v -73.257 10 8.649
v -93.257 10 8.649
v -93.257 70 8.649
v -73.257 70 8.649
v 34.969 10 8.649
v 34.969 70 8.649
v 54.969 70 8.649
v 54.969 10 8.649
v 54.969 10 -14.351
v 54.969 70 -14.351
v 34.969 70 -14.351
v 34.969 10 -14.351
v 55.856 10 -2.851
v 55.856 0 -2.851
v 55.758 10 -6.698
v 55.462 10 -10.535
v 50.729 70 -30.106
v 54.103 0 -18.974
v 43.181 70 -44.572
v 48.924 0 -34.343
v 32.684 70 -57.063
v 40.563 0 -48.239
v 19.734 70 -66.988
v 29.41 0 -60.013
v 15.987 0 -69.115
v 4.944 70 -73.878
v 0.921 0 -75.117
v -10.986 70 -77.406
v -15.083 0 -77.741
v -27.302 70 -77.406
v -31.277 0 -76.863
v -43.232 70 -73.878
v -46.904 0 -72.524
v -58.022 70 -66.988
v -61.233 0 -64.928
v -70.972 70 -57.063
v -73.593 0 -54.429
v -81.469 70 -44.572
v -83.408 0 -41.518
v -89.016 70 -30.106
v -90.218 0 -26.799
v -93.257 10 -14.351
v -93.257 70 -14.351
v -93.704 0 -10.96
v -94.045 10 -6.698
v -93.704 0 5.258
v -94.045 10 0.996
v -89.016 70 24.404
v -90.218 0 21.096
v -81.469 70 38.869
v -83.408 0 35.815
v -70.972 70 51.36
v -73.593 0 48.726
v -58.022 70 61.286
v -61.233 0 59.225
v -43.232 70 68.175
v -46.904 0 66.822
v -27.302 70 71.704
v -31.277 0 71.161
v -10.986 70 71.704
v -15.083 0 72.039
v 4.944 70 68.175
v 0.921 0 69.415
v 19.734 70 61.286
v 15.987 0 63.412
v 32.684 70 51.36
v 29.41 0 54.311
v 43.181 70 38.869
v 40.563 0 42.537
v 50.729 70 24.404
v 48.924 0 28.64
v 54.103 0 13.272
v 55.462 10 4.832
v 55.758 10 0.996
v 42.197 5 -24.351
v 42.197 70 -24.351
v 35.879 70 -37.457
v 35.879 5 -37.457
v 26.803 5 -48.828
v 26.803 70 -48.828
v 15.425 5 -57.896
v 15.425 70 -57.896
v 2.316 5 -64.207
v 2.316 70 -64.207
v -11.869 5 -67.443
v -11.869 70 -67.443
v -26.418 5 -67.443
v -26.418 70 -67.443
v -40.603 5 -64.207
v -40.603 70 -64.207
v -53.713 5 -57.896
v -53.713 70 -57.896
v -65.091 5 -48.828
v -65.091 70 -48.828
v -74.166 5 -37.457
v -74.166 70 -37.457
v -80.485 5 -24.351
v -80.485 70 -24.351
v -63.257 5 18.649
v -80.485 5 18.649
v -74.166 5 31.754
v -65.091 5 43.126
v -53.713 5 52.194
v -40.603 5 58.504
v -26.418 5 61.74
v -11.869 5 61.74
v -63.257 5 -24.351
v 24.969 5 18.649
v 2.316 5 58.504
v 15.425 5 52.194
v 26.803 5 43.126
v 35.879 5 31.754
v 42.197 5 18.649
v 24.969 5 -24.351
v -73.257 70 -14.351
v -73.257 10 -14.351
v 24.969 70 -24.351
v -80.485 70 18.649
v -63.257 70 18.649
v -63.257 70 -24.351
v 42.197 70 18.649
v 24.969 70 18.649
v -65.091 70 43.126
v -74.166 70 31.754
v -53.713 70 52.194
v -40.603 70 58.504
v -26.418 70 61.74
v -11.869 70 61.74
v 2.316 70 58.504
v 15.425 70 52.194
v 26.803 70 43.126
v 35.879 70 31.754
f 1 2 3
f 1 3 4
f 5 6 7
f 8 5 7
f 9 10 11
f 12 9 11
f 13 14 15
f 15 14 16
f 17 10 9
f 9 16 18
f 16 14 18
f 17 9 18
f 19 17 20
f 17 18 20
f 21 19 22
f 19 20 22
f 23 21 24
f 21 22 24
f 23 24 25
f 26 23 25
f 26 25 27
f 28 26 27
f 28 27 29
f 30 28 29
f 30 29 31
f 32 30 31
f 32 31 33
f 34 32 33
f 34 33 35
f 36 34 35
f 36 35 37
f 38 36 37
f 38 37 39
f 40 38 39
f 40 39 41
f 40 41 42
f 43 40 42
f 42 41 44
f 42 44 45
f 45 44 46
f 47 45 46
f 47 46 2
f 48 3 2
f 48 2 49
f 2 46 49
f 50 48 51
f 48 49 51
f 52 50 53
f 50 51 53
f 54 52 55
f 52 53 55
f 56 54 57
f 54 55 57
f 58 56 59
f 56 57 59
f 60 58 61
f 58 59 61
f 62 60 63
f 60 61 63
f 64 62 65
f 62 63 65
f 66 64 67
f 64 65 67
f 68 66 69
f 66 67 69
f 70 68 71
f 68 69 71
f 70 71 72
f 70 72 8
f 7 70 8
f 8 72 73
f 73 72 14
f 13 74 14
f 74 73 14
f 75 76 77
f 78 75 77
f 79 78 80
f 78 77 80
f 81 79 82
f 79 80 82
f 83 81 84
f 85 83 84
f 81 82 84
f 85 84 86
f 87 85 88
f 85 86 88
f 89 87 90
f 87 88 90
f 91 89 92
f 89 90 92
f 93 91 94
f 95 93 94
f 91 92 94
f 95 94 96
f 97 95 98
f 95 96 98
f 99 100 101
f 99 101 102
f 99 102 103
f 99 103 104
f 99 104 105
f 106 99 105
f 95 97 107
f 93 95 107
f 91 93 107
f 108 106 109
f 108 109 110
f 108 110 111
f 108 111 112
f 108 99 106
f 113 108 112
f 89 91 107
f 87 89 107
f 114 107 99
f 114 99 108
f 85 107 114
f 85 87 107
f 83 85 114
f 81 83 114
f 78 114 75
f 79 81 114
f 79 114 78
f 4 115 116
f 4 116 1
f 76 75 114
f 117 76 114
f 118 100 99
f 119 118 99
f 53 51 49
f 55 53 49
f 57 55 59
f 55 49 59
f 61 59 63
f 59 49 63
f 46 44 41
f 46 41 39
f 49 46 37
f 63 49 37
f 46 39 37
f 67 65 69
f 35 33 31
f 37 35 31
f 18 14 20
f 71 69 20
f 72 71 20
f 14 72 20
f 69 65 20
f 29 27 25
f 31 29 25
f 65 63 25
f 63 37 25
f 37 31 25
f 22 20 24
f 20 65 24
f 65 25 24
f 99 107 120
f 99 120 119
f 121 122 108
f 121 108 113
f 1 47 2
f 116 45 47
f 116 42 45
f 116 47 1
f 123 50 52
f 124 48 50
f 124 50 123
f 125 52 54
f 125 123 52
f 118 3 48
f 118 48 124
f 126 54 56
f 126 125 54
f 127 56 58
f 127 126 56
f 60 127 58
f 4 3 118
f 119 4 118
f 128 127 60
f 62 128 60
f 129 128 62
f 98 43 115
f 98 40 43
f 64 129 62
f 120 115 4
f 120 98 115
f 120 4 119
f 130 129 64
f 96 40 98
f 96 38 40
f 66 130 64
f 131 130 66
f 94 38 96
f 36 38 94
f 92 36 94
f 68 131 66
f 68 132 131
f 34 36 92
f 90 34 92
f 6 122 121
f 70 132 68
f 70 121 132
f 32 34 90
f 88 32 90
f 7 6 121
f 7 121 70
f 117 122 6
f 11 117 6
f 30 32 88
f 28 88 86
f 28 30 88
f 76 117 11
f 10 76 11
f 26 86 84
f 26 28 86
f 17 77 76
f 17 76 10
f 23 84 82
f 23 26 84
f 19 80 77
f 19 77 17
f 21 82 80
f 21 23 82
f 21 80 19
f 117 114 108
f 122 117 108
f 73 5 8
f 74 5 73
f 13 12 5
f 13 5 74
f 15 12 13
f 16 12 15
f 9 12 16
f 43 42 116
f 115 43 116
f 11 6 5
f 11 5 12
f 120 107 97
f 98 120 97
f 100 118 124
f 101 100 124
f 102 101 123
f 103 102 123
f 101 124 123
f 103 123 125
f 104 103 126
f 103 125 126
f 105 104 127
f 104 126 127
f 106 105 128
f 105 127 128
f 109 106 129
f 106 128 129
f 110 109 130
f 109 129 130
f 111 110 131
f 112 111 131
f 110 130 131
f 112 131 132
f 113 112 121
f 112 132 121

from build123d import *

# Parameters (mm, degrees)
SKETCH1_R           = 75
BOSS_EXTRUDE1_DEPTH = 70
CUT_EXTRUDE1_DEPTH  = 65
SKETCH3_3_W         = 21.992128126
SKETCH3_3_H         = 23
SKETCH3_3_W_2       = 22.893011501
CUT_EXTRUDE3_DEPTH  = 60
BOSS_EXTRUDE2_START = 65
BOSS_EXTRUDE2_DEPTH = 65


with BuildPart() as part:
    # Sketch1 → Boss-Extrude1 (new body)
    with BuildSketch(Plane(origin=(0, 0, 0), x_dir=(1, 0, 0), z_dir=(0, 1, 0))):
        with Locations((-19.143760263, 2.851198337)):
            Circle(SKETCH1_R)
    extrude(amount=BOSS_EXTRUDE1_DEPTH)

    # Sketch3 → Cut-Extrude1 (cut)
    with BuildSketch(Plane(origin=(0, 70, 0), x_dir=(1, 0, 0), z_dir=(0, 1, 0))):
        with BuildLine():
            Line((34.969329, 14.351198337), (44.830844074, 14.351198337))
            ThreePointArc((44.830844074, 14.351198337), (-19.143760263, 67.851198337), (-83.118364599, 14.351198337))
            Line((-83.118364599, 14.351198337), (-73.256849525, 14.351198337))
            Line((-73.256849525, 14.351198337), (-73.256849525, -8.648801663))
            Line((-73.256849525, -8.648801663), (-83.118364599, -8.648801663))
            ThreePointArc((-83.118364599, -8.648801663), (-19.143760263, -62.148801663), (44.830844074, -8.648801663))
            Line((44.830844074, -8.648801663), (34.969329, -8.648801663))
            Line((34.969329, -8.648801663), (34.969329, 14.351198337))
        make_face()
    extrude(amount=-CUT_EXTRUDE1_DEPTH, mode=Mode.SUBTRACT)

    # Sketch3<3> → Cut-Extrude3 (cut)
    with BuildSketch(Plane(origin=(0, 70, 0), x_dir=(1, 0, 0), z_dir=(0, 1, 0))):
        with Locations((45.965393063, 2.851198337)):
            Rectangle(SKETCH3_3_W, SKETCH3_3_H)
        with Locations((-84.703355276, 2.851198337)):
            Rectangle(SKETCH3_3_W_2, SKETCH3_3_H)
    extrude(amount=-CUT_EXTRUDE3_DEPTH, mode=Mode.SUBTRACT)

    # Sketch6 → Boss-Extrude2 (add)
    with BuildSketch(Plane(origin=(0, 5, 0), x_dir=(1, 0, 0), z_dir=(0, 1, 0)).offset(BOSS_EXTRUDE2_START)):
        with BuildLine():
            ThreePointArc((-80.485018809, 24.351198337), (-82.000871018, 19.403649138), (-83.118364599, 14.351198337))
            Line((-83.118364599, 14.351198337), (-73.256849525, 14.351198337))
            Line((-73.256849525, 14.351198337), (-73.256849525, -8.648801663))
            Line((-73.256849525, -8.648801663), (-83.118364599, -8.648801663))
            ThreePointArc((-83.118364599, -8.648801663), (-82.000871018, -13.701252464), (-80.485018809, -18.648801663))
            Line((-80.485018809, -18.648801663), (-63.256849525, -18.648801663))
            Line((-63.256849525, -18.648801663), (-63.256849525, 24.351198337))
            Line((-63.256849525, 24.351198337), (-80.485018809, 24.351198337))
        make_face()
        with BuildLine():
            ThreePointArc((44.830844074, 14.351198337), (43.713350492, 19.403649138), (42.197498283, 24.351198337))
            Line((42.197498283, 24.351198337), (24.969329, 24.351198337))
            Line((24.969329, 24.351198337), (24.969329, -18.648801663))
            Line((24.969329, -18.648801663), (42.197498283, -18.648801663))
            ThreePointArc((42.197498283, -18.648801663), (43.713350492, -13.701252464), (44.830844074, -8.648801663))
            Line((44.830844074, -8.648801663), (34.969329, -8.648801663))
            Line((34.969329, -8.648801663), (34.969329, 14.351198337))
            Line((34.969329, 14.351198337), (44.830844074, 14.351198337))
        make_face()
    extrude(amount=-BOSS_EXTRUDE2_DEPTH)


solid = part.part
